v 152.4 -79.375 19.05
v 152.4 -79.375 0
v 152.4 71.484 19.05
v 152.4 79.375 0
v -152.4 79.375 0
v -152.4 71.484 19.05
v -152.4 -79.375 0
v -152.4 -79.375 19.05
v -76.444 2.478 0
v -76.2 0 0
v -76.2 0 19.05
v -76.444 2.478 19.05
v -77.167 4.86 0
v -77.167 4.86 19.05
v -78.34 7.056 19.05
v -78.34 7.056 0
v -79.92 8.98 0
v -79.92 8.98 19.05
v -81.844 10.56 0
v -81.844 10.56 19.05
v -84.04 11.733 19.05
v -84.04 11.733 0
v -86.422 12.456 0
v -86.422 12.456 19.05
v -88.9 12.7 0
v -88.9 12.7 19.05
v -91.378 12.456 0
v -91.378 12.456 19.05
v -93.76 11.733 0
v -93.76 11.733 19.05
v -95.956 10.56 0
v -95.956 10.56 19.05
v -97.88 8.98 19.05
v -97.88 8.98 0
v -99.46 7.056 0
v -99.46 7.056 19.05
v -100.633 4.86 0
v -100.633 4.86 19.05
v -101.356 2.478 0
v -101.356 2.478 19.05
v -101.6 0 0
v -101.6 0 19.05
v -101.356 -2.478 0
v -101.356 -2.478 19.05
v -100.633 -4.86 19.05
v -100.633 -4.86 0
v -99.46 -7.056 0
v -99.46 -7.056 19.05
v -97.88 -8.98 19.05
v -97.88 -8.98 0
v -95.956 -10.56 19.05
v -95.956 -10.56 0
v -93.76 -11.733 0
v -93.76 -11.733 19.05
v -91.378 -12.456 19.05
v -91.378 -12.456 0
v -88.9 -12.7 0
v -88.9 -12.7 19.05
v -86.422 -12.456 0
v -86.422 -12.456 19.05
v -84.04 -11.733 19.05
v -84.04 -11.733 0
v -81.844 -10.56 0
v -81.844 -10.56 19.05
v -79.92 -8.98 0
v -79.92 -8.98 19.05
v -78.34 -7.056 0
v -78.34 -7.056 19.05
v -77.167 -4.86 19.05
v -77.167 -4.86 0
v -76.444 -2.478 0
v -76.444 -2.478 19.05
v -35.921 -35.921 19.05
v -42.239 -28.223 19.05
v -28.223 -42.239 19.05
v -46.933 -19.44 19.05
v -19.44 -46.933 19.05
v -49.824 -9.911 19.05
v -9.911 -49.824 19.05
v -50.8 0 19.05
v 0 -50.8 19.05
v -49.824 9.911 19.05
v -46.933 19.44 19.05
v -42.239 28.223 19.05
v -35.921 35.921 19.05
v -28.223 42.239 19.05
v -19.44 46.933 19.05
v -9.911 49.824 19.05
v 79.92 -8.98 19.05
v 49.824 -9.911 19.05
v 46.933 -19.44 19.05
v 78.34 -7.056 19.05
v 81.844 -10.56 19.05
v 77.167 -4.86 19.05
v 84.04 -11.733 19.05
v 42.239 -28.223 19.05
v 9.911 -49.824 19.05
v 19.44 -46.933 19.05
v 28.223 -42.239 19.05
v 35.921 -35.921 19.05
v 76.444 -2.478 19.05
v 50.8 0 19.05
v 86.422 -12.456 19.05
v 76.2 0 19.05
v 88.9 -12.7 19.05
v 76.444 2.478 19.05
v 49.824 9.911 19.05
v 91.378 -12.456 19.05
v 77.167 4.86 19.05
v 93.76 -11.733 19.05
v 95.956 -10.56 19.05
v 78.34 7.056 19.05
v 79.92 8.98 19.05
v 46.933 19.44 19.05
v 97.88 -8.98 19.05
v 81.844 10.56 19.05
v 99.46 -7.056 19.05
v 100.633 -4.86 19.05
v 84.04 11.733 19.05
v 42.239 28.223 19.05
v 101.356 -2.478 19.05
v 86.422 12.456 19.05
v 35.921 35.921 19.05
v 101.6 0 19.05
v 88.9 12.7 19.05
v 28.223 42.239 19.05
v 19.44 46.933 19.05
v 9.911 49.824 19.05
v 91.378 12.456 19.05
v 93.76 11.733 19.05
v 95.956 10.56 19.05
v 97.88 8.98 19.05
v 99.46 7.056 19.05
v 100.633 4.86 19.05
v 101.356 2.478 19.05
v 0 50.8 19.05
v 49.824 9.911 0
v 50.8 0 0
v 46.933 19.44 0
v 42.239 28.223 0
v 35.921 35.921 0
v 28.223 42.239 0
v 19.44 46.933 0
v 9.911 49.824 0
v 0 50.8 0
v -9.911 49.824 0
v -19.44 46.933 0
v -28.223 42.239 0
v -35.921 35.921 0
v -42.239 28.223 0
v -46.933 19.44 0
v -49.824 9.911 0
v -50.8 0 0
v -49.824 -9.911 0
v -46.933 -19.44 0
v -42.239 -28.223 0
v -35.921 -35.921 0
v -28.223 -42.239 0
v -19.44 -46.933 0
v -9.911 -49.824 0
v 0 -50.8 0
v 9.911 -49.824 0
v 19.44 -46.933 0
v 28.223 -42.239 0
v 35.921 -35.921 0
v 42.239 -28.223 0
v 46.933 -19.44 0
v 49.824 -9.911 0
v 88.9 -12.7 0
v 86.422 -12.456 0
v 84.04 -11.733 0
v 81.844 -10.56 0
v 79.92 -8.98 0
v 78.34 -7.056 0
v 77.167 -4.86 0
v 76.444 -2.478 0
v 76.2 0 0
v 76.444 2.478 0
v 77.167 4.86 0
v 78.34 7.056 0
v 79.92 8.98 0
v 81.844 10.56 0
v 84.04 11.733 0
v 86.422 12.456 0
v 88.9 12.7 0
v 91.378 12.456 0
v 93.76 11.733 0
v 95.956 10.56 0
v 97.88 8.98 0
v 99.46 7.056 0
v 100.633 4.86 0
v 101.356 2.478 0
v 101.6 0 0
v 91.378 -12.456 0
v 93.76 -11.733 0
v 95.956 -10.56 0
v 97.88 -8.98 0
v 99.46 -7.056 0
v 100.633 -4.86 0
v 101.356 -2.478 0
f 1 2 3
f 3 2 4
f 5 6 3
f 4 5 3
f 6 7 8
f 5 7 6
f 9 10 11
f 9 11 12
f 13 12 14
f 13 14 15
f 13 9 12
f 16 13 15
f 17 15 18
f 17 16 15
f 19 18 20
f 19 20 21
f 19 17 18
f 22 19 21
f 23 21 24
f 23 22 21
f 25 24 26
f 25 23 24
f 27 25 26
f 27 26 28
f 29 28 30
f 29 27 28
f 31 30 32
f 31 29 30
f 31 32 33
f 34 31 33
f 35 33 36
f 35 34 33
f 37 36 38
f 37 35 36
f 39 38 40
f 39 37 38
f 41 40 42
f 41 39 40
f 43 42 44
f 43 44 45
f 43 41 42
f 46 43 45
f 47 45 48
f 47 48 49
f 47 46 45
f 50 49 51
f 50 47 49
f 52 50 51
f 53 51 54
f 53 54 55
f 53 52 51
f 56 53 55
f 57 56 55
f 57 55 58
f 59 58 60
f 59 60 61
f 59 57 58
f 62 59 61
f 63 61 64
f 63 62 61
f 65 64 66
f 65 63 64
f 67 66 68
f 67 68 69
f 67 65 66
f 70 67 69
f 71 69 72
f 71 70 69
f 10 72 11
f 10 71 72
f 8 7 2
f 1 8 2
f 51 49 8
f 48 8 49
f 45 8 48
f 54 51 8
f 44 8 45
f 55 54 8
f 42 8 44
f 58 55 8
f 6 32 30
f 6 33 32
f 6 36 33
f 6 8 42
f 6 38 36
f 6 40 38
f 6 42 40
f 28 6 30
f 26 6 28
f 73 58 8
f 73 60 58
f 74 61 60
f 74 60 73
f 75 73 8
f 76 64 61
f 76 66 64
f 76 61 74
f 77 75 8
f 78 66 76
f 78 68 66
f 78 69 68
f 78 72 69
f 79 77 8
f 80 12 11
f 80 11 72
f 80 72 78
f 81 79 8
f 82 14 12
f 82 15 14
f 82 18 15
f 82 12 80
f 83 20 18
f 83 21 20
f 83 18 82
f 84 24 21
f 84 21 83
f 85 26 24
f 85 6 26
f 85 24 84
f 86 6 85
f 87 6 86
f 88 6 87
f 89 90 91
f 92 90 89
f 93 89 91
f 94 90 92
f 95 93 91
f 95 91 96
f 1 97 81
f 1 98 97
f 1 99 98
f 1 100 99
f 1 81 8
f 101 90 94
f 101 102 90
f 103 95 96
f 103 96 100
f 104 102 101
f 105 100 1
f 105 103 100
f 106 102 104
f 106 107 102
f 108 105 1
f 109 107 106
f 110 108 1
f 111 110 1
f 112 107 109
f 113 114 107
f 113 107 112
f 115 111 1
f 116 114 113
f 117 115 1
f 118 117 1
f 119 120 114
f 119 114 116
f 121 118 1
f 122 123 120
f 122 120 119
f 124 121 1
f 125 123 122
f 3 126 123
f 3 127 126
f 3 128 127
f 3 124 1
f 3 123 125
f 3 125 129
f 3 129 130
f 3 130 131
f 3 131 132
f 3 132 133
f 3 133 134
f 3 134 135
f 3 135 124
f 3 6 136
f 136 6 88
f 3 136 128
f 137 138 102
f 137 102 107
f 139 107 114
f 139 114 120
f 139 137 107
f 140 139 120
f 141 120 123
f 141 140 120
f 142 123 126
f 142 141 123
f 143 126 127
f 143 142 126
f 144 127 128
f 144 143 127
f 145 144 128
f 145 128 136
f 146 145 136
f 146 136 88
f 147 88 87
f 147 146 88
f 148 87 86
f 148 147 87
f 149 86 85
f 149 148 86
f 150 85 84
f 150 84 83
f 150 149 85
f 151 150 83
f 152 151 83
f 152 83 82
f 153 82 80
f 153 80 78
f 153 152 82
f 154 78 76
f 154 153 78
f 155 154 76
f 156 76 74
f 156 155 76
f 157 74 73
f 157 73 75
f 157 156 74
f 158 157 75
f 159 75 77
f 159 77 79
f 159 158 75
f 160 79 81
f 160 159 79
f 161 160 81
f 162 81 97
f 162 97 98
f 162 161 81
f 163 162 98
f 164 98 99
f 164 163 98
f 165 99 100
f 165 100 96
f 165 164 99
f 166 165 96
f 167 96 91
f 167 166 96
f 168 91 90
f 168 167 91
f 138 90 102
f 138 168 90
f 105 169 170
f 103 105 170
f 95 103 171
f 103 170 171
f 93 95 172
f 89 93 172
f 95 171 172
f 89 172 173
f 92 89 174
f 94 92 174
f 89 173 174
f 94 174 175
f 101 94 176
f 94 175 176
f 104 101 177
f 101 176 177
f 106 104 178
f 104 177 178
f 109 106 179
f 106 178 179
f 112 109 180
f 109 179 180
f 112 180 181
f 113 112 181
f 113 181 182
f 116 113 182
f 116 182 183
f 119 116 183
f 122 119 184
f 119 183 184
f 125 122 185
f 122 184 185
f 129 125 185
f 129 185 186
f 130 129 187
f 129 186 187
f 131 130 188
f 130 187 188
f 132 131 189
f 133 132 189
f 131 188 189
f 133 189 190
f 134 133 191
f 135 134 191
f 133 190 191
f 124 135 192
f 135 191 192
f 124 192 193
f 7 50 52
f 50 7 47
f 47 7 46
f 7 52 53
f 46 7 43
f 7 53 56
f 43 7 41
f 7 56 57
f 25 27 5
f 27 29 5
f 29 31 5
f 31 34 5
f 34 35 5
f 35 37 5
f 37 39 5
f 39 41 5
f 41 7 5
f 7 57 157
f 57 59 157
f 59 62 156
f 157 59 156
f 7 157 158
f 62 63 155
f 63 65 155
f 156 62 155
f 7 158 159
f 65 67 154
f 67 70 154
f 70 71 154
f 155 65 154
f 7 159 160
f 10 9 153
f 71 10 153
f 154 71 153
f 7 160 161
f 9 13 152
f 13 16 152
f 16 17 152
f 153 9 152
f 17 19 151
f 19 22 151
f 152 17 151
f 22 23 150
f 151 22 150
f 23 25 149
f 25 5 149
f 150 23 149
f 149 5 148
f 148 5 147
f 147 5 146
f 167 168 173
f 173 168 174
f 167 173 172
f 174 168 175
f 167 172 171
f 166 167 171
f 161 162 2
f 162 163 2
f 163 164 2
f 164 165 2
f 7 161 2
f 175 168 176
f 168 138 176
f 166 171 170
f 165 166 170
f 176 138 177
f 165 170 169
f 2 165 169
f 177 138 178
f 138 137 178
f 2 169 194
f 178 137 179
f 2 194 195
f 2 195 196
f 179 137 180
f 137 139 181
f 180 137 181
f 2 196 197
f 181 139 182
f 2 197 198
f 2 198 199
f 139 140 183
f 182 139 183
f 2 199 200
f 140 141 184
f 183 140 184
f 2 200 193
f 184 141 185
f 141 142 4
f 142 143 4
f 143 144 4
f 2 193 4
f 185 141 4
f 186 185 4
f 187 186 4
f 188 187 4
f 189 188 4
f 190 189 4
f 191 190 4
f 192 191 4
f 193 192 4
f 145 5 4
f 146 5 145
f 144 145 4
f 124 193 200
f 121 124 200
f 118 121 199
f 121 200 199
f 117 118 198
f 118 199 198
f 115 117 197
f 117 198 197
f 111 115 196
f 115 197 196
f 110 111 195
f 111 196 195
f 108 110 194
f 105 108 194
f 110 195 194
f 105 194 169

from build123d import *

# Parameters (mm, degrees)
F0_W     = 304.8
F0_H     = 158.75
F0_R     = 12.7
F0_R_2   = 50.8
F1_DEPTH = 19.05
F2_SIZE2 = 7.890758
F2_SIZE  = 19.04999


# Not quite as in the source:
# - a fillet or chamfer is up to 0.001 mm smaller than in the source, because OpenCascade refuses the exact size


with BuildPart() as f1:
    # F0 (on Top) → F1 (new body)
    with BuildSketch(Plane.XY):
        Rectangle(F0_W, F0_H)
        with Locations((-88.9, 0)):
            Circle(F0_R, mode=Mode.SUBTRACT)
        Circle(F0_R_2, mode=Mode.SUBTRACT)
        with BuildLine():
            ThreePointArc((88.9, -12.7), (79.9197438789, 8.9802561211), (101.6, 0))
            ThreePointArc((101.6, 0), (97.8802561211, -8.9802561211), (88.9, -12.7))
        make_face(mode=Mode.SUBTRACT)
    extrude(amount=F1_DEPTH)

    # F2 (size 19.05 and 7.8907683632 in the source; OpenCascade refuses exactly that, so slightly less here)
    f2_edges = [f1.edges().sort_by_distance(p)[0] for p in [
        (0, 79.375, 19.05),
    ]]
    f2_side = f1.faces().sort_by_distance((0, 79.375, 9.525))[0]
    chamfer(f2_edges, length=F2_SIZE, length2=F2_SIZE2, reference=f2_side)


solid = f1.part
